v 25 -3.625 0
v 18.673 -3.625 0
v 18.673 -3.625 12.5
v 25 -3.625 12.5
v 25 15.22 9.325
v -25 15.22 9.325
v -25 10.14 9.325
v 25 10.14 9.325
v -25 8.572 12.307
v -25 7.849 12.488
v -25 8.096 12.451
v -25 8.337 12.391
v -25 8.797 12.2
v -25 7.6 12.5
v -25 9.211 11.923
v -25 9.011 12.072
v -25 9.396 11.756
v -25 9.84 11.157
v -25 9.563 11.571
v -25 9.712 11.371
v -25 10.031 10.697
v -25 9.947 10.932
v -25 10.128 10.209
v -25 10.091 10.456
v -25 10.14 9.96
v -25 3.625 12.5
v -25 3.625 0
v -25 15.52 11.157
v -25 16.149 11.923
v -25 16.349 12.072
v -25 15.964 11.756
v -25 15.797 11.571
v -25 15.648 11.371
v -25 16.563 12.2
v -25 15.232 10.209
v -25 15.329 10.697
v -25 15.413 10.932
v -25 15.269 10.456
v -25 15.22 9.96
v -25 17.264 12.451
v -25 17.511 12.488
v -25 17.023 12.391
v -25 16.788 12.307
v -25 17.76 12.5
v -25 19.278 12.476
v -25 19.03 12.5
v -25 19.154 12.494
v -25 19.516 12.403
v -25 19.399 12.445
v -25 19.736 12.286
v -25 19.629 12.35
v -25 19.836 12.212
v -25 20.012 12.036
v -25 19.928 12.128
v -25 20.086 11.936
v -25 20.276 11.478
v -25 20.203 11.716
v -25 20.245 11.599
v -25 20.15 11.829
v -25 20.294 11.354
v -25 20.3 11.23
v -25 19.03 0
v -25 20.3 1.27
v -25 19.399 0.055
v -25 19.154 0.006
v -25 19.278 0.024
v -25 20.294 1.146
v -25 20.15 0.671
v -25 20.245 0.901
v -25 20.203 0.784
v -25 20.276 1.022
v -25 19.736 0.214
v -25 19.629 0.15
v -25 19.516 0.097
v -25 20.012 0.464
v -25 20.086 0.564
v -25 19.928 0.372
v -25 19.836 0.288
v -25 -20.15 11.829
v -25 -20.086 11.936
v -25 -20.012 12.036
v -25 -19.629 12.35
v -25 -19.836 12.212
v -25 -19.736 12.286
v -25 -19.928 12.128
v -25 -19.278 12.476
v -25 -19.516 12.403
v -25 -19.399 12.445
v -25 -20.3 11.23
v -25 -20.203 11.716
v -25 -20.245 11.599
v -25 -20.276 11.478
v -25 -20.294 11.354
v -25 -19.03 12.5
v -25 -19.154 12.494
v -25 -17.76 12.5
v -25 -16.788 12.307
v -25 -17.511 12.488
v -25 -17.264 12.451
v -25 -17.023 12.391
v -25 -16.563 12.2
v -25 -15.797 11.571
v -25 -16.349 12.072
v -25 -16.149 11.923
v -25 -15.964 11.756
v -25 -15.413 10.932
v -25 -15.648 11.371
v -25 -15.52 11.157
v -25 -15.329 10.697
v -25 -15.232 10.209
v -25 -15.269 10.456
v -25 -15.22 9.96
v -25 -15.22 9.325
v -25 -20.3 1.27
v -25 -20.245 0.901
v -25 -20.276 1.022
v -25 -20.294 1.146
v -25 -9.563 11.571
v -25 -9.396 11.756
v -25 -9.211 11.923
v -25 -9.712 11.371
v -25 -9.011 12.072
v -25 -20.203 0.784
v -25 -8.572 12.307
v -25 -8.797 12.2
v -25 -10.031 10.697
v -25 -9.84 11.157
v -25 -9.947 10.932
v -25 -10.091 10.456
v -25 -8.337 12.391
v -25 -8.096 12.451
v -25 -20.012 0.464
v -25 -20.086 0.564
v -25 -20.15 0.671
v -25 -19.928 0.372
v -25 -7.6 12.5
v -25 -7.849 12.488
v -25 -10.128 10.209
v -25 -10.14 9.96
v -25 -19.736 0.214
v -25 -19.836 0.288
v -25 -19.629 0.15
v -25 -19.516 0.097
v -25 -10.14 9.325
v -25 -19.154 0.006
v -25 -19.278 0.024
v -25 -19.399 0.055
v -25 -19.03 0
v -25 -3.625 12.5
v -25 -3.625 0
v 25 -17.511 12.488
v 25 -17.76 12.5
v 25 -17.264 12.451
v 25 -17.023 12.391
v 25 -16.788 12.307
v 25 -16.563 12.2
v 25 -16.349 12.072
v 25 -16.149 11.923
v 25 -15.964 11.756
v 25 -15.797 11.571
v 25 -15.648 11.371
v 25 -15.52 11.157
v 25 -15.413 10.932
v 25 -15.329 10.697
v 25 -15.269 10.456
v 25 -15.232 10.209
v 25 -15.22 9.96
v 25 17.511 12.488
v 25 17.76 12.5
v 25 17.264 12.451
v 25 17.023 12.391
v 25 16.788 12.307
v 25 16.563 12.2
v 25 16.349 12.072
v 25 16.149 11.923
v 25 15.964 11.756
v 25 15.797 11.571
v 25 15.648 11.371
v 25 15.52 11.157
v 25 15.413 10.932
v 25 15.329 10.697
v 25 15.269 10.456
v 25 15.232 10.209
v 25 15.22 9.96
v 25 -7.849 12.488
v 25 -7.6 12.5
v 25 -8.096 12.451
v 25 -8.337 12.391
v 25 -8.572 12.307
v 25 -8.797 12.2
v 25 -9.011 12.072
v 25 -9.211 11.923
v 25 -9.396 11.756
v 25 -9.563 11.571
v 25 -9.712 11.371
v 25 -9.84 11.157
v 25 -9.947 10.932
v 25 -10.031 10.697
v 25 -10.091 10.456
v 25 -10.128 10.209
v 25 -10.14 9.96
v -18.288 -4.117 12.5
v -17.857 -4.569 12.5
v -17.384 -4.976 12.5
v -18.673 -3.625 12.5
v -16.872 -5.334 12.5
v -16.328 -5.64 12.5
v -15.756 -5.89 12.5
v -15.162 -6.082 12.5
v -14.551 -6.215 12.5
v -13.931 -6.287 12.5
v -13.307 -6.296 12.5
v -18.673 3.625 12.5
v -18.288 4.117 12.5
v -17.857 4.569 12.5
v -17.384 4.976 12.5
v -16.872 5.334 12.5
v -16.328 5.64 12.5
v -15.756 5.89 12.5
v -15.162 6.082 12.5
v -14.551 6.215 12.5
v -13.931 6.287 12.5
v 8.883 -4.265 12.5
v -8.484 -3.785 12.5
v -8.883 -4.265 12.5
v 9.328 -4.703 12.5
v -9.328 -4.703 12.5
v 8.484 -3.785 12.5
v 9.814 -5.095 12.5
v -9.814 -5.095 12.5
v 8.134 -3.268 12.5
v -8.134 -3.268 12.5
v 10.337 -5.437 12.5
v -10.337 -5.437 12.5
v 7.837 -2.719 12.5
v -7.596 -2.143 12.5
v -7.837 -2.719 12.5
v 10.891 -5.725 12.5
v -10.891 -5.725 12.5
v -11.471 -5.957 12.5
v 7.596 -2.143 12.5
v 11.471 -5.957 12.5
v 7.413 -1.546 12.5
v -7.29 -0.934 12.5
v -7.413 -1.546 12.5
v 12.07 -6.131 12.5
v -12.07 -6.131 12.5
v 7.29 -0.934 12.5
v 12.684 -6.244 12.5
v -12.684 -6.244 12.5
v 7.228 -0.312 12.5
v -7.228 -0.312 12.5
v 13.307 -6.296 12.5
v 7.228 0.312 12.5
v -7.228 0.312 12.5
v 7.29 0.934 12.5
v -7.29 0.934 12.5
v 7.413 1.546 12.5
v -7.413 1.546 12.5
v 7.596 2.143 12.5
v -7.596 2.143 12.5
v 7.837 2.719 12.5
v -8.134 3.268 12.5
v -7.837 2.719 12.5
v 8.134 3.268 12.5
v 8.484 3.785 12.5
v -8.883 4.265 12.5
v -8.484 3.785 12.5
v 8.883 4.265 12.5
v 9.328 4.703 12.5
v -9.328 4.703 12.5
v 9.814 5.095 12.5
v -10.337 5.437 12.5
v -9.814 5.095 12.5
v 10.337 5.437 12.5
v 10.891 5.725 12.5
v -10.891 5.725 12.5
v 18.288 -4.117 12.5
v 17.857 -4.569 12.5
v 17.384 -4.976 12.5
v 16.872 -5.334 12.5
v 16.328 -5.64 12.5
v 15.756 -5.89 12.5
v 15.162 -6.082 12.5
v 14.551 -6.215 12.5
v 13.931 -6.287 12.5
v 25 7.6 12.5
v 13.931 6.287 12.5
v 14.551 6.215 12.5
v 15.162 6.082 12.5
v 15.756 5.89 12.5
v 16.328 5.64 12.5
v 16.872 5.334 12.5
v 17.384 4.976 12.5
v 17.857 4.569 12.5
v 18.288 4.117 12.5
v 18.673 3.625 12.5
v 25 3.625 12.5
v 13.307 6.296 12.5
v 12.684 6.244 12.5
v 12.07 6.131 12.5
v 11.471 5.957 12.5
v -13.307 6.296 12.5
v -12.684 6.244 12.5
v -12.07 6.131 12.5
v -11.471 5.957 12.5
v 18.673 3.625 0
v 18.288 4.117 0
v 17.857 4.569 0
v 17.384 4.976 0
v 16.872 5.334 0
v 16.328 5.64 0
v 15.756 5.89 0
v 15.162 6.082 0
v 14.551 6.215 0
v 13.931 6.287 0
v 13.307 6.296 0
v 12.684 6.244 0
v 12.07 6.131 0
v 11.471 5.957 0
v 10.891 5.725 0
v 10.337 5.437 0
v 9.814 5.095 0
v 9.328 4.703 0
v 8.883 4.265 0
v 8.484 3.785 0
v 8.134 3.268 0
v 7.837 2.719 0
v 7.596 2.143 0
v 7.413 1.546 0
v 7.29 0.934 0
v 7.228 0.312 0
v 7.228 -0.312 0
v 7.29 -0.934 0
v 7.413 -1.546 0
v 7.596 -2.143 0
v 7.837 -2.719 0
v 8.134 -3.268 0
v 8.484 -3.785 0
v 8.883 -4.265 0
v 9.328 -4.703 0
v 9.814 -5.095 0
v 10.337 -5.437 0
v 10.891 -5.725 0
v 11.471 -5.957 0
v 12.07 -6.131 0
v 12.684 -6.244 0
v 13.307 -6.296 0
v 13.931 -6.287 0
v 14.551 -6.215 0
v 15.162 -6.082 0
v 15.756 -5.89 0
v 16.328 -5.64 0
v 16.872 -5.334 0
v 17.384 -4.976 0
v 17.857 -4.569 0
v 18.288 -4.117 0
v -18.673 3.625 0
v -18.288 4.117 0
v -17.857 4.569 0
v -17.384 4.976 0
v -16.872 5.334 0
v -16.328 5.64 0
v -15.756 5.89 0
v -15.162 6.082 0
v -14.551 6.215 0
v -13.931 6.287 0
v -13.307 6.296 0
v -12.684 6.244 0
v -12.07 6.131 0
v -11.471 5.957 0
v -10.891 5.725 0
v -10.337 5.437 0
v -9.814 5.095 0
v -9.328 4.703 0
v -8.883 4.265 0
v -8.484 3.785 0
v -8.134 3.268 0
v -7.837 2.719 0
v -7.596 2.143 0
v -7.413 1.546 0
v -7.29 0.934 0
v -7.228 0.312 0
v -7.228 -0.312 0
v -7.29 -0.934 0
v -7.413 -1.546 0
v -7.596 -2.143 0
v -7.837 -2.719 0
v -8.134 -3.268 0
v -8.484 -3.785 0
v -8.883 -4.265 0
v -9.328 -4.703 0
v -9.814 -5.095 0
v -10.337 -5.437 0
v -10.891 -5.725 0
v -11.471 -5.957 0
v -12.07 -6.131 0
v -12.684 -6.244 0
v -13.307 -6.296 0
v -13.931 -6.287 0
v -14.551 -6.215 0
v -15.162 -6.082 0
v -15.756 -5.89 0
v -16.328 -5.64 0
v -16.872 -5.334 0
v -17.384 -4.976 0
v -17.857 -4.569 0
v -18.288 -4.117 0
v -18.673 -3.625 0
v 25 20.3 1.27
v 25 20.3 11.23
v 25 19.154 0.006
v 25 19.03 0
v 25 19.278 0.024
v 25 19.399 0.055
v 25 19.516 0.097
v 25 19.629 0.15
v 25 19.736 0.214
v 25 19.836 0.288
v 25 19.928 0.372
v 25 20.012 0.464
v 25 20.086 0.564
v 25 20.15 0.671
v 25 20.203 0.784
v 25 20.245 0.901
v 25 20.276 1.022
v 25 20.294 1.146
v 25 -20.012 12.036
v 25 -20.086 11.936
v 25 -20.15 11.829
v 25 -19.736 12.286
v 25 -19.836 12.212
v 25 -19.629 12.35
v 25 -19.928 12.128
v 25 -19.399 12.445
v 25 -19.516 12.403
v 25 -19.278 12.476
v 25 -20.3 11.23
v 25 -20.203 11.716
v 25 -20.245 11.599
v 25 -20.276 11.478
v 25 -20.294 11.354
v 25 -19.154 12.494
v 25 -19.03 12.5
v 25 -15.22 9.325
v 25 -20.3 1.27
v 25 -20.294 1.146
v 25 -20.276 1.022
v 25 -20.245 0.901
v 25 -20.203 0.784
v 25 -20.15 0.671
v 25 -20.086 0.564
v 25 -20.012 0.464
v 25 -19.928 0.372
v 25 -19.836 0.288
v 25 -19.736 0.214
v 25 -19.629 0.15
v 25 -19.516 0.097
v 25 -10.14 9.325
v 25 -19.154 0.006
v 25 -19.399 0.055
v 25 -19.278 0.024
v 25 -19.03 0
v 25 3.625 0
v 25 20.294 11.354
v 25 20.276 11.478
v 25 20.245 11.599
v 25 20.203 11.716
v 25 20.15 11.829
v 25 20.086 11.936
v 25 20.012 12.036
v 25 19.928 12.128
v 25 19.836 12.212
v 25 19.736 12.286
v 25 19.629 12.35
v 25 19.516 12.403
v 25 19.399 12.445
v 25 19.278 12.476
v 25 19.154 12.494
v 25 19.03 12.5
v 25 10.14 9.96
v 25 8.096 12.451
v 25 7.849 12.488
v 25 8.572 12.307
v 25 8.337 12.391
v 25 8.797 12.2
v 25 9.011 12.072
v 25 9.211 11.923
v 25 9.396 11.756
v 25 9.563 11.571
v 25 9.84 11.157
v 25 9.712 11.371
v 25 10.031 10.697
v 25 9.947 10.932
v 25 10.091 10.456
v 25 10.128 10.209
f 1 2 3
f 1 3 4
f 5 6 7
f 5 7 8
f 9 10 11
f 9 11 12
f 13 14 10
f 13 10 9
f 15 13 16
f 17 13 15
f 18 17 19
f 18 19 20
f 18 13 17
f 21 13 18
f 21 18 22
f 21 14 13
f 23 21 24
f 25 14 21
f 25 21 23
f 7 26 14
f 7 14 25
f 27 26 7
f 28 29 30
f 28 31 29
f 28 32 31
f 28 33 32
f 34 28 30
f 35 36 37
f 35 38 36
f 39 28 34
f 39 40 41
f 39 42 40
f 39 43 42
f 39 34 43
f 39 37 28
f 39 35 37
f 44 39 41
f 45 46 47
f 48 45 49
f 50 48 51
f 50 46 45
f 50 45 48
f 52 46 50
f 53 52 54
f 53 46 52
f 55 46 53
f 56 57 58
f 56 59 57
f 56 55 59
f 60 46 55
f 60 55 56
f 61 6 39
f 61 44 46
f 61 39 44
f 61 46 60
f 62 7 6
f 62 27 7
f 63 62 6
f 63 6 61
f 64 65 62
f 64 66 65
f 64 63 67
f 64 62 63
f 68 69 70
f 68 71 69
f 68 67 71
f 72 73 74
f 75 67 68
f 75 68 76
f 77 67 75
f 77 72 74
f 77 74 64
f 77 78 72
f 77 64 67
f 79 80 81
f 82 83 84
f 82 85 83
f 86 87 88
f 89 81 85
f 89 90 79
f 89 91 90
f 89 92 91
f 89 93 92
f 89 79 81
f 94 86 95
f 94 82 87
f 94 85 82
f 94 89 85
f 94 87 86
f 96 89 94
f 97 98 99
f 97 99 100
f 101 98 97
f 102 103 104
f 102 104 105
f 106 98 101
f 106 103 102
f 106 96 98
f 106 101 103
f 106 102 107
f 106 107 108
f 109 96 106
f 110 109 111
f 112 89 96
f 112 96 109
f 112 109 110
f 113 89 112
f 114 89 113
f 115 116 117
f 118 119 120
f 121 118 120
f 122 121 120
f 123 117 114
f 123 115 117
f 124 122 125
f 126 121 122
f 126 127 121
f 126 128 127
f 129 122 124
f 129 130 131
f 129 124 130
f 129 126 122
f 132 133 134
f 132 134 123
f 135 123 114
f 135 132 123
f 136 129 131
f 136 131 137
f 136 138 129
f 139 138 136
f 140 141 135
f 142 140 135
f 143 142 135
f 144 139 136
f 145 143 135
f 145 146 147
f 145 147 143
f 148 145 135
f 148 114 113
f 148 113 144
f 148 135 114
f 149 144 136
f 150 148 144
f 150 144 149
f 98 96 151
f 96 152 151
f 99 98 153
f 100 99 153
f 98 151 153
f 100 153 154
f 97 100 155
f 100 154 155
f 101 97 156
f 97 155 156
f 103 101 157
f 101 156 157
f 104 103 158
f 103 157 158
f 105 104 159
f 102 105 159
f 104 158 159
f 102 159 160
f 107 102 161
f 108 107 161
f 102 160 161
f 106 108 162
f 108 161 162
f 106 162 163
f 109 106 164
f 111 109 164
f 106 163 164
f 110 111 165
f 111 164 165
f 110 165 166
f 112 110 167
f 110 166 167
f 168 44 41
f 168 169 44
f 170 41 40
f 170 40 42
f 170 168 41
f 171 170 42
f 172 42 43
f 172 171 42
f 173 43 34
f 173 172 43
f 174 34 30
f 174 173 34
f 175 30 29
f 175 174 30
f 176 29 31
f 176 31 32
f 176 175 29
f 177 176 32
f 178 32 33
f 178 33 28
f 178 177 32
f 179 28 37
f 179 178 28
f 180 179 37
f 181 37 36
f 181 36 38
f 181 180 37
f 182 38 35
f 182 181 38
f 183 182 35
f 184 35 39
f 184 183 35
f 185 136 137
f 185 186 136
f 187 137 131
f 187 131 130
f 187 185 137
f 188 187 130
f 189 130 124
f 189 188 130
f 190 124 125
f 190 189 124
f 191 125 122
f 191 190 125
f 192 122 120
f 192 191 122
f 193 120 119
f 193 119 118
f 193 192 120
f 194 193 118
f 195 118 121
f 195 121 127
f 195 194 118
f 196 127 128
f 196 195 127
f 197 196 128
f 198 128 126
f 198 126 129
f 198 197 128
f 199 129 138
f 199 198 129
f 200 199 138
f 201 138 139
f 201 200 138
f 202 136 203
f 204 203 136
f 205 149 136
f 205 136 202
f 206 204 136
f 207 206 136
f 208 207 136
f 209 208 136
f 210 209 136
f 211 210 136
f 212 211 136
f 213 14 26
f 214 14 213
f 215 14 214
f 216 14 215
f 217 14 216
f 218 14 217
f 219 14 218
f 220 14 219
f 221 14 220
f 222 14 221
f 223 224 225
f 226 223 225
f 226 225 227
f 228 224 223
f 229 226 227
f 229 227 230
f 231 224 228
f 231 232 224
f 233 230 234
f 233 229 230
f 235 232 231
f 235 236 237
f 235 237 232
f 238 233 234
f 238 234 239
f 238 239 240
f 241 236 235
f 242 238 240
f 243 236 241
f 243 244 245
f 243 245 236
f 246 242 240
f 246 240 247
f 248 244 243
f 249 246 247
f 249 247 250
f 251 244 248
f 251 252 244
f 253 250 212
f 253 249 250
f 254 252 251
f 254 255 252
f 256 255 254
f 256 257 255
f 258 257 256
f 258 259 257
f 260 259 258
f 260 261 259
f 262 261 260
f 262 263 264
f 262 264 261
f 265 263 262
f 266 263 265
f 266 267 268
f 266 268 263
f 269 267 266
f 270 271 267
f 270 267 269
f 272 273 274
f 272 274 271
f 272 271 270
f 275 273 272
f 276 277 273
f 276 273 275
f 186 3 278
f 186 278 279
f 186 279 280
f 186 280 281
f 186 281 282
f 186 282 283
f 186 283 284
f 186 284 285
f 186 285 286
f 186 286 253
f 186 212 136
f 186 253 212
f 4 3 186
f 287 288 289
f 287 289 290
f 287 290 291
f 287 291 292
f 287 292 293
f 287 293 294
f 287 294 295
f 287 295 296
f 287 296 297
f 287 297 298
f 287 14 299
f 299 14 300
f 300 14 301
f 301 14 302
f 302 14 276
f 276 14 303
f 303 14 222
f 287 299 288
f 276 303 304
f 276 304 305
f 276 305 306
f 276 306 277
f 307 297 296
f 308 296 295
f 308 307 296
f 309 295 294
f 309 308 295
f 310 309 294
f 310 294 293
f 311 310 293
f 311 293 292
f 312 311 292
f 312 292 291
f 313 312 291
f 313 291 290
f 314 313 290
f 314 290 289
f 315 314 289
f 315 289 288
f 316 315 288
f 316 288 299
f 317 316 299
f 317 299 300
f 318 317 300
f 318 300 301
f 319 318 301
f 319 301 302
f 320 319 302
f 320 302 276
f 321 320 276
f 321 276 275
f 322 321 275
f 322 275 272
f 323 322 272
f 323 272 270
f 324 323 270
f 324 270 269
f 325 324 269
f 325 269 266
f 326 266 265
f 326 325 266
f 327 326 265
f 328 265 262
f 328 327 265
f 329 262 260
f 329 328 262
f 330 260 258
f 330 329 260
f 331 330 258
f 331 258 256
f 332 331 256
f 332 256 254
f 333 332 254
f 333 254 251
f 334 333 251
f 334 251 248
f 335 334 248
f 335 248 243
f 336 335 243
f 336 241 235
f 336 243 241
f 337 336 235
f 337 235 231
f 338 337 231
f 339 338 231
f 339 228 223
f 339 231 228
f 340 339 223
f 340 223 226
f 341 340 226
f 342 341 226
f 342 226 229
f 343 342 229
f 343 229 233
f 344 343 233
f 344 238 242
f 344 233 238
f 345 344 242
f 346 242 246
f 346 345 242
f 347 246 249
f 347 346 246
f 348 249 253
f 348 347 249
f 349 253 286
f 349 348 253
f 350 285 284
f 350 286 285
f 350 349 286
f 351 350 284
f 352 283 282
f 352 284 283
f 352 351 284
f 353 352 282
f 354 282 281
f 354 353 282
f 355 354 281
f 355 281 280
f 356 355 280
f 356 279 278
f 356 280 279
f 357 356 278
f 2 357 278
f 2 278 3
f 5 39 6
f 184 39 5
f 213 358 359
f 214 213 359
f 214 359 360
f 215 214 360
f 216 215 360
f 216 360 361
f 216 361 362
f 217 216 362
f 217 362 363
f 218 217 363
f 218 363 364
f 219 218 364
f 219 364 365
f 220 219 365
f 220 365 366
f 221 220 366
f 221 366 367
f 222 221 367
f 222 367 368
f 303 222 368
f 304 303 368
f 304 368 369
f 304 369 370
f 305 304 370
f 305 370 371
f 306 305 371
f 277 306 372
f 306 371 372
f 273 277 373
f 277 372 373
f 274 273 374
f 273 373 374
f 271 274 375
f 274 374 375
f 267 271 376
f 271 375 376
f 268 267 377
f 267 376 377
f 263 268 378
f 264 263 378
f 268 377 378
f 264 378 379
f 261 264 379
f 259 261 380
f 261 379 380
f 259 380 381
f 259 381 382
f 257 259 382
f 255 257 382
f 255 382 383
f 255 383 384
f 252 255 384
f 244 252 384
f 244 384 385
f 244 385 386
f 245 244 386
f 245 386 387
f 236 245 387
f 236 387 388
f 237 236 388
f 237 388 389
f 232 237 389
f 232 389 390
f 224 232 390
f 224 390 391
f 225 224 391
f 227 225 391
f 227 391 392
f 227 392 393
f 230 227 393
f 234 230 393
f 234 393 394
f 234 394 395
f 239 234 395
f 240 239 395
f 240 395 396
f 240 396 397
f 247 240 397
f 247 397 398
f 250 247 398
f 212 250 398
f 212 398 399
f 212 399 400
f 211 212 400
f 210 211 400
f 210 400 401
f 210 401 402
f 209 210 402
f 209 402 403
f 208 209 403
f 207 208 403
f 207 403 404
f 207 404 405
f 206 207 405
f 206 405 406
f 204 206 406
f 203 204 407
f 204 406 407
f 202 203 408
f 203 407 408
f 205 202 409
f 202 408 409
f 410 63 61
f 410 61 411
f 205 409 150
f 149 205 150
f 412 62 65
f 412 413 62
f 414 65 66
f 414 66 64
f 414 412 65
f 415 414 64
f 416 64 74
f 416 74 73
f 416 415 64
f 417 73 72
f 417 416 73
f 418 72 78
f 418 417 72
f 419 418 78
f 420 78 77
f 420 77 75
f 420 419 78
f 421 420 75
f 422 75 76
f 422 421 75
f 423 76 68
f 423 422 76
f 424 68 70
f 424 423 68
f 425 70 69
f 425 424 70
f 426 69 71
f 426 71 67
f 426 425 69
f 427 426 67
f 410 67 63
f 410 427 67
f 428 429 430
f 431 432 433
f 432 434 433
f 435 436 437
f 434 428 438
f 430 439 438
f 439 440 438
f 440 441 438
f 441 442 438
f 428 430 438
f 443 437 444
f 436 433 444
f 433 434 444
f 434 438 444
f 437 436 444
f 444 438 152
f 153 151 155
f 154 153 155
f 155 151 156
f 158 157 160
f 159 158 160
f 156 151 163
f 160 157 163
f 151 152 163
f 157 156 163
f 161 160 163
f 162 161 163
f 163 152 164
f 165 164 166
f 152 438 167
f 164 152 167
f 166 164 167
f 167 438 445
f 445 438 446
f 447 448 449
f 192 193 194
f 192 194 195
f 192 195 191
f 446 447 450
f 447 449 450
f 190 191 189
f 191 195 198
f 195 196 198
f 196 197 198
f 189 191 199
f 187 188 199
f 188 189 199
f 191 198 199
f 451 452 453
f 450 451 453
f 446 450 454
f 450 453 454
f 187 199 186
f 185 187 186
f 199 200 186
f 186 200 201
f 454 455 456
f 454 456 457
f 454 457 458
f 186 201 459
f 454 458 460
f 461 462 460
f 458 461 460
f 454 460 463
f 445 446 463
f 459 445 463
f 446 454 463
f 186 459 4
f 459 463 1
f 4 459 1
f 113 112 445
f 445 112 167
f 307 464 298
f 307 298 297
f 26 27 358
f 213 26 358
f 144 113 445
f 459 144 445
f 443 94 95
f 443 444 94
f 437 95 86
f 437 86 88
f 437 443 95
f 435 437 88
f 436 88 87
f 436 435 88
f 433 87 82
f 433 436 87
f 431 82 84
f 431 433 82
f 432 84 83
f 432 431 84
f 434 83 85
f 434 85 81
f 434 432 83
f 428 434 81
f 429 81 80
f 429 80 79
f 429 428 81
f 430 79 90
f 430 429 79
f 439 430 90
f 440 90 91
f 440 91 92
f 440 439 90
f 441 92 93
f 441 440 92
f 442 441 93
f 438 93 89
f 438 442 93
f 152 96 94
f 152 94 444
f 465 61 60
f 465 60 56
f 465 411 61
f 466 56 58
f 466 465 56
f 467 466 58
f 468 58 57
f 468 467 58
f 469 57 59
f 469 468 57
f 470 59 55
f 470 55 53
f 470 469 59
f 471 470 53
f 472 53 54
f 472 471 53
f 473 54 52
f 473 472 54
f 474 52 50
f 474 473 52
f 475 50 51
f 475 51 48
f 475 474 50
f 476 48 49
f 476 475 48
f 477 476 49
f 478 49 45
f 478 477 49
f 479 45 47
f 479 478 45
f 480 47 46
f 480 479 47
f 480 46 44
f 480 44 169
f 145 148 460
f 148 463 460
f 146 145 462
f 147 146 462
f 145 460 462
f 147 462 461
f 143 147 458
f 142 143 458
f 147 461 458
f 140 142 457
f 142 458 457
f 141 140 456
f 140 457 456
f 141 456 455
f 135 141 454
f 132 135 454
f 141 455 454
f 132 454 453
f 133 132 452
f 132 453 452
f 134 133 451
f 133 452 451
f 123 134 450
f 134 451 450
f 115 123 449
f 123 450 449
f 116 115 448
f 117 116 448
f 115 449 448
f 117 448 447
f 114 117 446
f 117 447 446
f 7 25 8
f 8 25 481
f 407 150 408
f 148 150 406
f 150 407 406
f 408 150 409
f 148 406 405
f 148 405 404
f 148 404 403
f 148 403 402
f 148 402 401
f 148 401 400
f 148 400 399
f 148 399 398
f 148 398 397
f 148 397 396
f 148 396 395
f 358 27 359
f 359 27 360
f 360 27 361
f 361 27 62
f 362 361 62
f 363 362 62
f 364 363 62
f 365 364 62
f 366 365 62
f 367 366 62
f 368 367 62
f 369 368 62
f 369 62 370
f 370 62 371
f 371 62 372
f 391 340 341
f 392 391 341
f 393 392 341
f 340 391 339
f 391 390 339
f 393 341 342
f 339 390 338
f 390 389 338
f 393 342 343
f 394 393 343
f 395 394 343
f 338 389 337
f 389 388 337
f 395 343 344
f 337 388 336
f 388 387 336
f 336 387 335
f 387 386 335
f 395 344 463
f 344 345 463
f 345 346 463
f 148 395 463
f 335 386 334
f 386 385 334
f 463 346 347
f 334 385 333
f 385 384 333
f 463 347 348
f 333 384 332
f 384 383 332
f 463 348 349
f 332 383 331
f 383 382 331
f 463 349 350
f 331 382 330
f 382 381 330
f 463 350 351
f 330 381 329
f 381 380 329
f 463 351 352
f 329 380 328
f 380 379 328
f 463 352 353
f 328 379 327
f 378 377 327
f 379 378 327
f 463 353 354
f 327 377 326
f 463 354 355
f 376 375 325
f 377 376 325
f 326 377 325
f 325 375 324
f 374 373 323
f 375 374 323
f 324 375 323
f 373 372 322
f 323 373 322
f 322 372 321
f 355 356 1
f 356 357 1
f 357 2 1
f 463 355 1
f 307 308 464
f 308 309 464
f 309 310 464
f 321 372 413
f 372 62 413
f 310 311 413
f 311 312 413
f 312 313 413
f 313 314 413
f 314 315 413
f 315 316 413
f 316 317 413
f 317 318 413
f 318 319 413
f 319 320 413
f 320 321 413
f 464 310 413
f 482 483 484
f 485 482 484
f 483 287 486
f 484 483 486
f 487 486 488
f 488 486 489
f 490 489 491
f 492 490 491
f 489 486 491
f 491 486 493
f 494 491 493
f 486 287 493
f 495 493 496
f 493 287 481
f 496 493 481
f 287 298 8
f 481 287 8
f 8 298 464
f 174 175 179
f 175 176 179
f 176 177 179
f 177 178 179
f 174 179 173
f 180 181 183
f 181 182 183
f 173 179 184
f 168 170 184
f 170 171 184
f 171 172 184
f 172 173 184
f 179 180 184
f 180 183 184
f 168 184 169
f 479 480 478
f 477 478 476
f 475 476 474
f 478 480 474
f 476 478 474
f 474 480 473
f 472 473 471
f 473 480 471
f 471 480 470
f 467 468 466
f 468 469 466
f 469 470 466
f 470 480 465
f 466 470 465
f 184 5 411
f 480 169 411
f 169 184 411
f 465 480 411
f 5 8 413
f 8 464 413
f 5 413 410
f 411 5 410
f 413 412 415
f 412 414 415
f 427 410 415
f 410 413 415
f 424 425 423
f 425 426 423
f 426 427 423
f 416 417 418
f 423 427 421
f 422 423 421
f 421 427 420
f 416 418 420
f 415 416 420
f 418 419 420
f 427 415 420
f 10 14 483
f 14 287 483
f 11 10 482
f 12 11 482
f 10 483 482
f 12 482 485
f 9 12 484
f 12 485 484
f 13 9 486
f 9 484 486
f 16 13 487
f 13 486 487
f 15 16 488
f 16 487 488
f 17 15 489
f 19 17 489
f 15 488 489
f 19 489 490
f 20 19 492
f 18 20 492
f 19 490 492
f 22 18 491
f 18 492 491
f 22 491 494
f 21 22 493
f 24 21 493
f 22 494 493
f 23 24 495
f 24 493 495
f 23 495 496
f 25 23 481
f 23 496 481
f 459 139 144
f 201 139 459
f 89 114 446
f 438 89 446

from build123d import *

# Parameters (mm, degrees)
F0_W     = 50
F0_H     = 40.6
F1_DEPTH = 12.5
F3_DEPTH = 12.501
F4_W     = 50
F4_H     = 5.08
F5_DEPTH = 3.175
F6_R     = 1.27
F7_R     = 2.54


# Not quite as in the source:
# - a pattern or mirror of a feature is missing from the dataset's text; its kind, count and spacing are read off the source's solid


with BuildPart() as f1:
    # F0 (on Top) → F1 (new body)
    with BuildSketch(Plane.XY):
        Rectangle(F0_W, F0_H)
    extrude(amount=F1_DEPTH)

    # F2 (on Top) → F3 (cut, through all)
    with BuildSketch(Plane.XY):
        with BuildLine():
            Line((25, -2.794), (25, 3.625))
            Line((25, 3.625), (18.6726085627, 3.625))
            ThreePointArc((18.6726085627, 3.625), (7.22, 0), (18.6726085627, -3.625))
            Line((18.6726085627, -3.625), (25, -3.625))
            Line((25, -3.625), (25, -2.794))
        make_face()
    f3 = extrude(amount=F3_DEPTH, mode=Mode.SUBTRACT)

    # F3_copies: F3 across plane
    add(f3.mirror(Plane(origin=(0, 0, 0), x_dir=(0, 0, -1), z_dir=(-1, 0, 0))), mode=Mode.SUBTRACT)

    # F4 (on face) → F5 (cut)
    with BuildSketch(Plane.XY.offset(12.5)):
        with Locations((0, 12.68)):
            Rectangle(F4_W, F4_H)
    f5 = extrude(amount=-F5_DEPTH, mode=Mode.SUBTRACT)

    # F5_copies: F5 across plane
    add(f5.mirror(Plane(origin=(0, 0, 0), x_dir=(0, 0, -1), z_dir=(0, -1, 0))), mode=Mode.SUBTRACT)

    # F6
    f6_edges = [f1.edges().sort_by_distance(p)[0] for p in [
        (0, 20.3, 12.5),
        (0, -20.3, 12.5),
        (0, 20.3, 0),
        (0, -20.3, 0),
    ]]
    fillet(f6_edges, radius=F6_R)

    # F7
    f7_edges = [f1.edges().sort_by_distance(p)[0] for p in [
        (0, 15.22, 12.5),
        (0, 10.14, 12.5),
        (0, -10.14, 12.5),
        (0, -15.22, 12.5),
    ]]
    fillet(f7_edges, radius=F7_R)


solid = f1.part
